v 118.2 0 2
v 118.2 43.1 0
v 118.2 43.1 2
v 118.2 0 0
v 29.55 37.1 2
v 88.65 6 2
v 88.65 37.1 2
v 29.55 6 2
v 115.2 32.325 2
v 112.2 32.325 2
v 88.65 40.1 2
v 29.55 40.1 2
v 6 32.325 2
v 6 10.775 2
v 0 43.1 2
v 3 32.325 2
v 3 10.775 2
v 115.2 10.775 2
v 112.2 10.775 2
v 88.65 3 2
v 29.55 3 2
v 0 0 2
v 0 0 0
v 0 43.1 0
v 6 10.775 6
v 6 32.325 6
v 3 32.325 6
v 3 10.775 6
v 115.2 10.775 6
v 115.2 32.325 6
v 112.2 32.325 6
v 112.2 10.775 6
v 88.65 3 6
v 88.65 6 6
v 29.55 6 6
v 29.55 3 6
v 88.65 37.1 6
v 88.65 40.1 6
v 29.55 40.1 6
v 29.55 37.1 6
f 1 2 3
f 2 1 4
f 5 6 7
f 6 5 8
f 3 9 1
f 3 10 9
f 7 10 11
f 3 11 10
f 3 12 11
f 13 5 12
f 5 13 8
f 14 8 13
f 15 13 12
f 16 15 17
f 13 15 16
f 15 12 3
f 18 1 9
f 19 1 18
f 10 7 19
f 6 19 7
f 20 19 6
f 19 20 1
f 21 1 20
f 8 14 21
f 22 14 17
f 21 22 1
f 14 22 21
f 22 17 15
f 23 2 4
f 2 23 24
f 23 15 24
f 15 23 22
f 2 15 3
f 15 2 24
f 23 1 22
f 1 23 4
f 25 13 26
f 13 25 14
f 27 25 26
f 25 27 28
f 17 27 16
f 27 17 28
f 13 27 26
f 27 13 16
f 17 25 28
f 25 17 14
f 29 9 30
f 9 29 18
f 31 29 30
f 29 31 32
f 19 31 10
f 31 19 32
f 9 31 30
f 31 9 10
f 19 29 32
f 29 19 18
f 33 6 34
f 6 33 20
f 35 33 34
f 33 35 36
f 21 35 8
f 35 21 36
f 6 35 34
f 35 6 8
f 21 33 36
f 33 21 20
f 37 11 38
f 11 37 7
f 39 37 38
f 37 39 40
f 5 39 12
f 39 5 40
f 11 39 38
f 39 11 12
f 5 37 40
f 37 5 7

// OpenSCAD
// zrakotron floorplan

//univ. const.
uspace=2;
uheight=2;

//mq slot
mq_l=41;
mq_w=17.3;
mq_off=20;
mq_hole=[7.53,8.34,0];
mq_holder_d=2;
mq_holder_l=20;
//meta
mq_ext_l=mq_l+2*uspace;
mq_ext_w=mq_w+2*uspace+2*mq_holder_d;
mq_holder_h=mq_off+3.2;

//mg811
mg_l=41.9;
mg_w=32;
mg_hoffset=3.5;
mg_h1=[mg_hoffset,mg_hoffset,0];
mg_h2=[mg_l-mg_hoffset,mg_hoffset,0];
mg_h3=[mg_hoffset,mg_w-mg_hoffset,0];
mg_h4=[mg_l-mg_hoffset,mg_w-mg_hoffset,0];
mg_space=2;
//mg811 meta
mg_ext_l=mg_l+2*mg_space;
mg_ext_w=mg_w+2*mg_space;

//esp8266
esp_l=24.8;
esp_w=14.35;
esp_holder_d=2;
esp_holder_l=esp_l-5;
esp_holder_h=6;
//esp meta
esp_ext_l=esp_l+2*uspace;
esp_ext_w=esp_w+2*esp_holder_d+2*uspace;

//power splitter
ps_l=35.5;
ps_w=21.1;
ps_holder_h=6;
ps_holder_d=2;
ps_holder_l=20;
ps_space=2;
//ps meta
ps_ext_l=ps_l+2*ps_space;
ps_ext_w=ps_w+2*ps_holder_d+2*ps_space;

//step-up section
su_l=43.8;
su_w=21.5;
su_space=2;
su_h1=[6.66,su_w-2.45,0];
su_h2=[su_l-6.66,2.45,0];
//stepup meta
su_ext_l=su_l+2*su_space;
su_ext_w=su_w+2*su_space;

//uno board
uno_w=54.05;
uno_ll=65.66;
uno_lr=68.56;
uno_tspace=2;
uno_bspace=3;
uno_lspace=2;
uno_rspace=4;
//board meta
uno_ext_w=uno_w+uno_lspace+uno_rspace;
uno_ext_l=uno_lr+uno_tspace+uno_bspace;
//pins
pin1=[50.95,13.6,0];    //uz power - ne koristiti za iteaduino
pin2=[2.82,15.11,0];    //uz usb
pin3=[46.05,66,0];      // uz procesor
pin4=[18.05,66,0];
pinr=3.1/2;
pinh=6;
//pin meta
outr=pinr+1;
botr=pinr+3;

//shinyei dust sensor
shin_l=59;
shin_w=44.7;
shin_h=19.5;
shin_cable_d=5.35;
shin_cable_l=15;
shin_cable_h=4.8;
shin_cable_space=5;
shin_hole=[27.2,40.64,0];
//shinyei meta
shinyei_ext_l=2*uspace+shin_l;
shinyei_ext_w=2*uspace+shin_w;

//dht11
dht_l=26.5;
dht_w=22;
dht_h1=[6.5,3,0];
dht_h2=[6.5,19,0];
//dht meta
dht_ext_l=dht_l+2*uspace;
dht_ext_w=dht_w+2*uspace;

//box
box_h=50;
pylon_l=6+2*botr;
pylon_w=2*botr;
//meta
box_l=uno_ext_w+shinyei_ext_w+2*mq_ext_w;
box_w=shinyei_ext_l+mg_ext_w+dht_ext_w;

//floorplan meta
pylon_v=[uno_ext_w/2-pylon_l/2,uno_ext_l,0];
dht_v=[-dht_ext_l,shinyei_ext_l+mg_ext_w,0];
esp_v=[0,uno_ext_l+pylon_w,0];
mg_v=[-mg_ext_l,shinyei_ext_l,0];
shinyei_v=[-shinyei_ext_w,0,0];
ps_v=[uno_ext_w-ps_ext_l,uno_ext_l+pylon_w,0];
mq_v1=[uno_ext_w+mq_ext_w,su_ext_w,0];
mq_v2=[uno_ext_w,2*mq_ext_l+su_ext_w,0];
mq_v3=[uno_ext_w+2*mq_ext_w,su_ext_w,0];
mq_v4=[uno_ext_w+mq_ext_w,2*mq_ext_l+su_ext_w,0];
su_v=[uno_ext_w,0,0];

//wall meta
p1=[0.5-pylon_l/2,0.5-pylon_l/2,0];
p2=[box_l-0.5+pylon_l/2,0.5-pylon_l/2,0];
p3=[box_l-0.5+pylon_l/2,box_w-0.5+pylon_l/2,0];
p4=[0.5-pylon_l/2,box_w-0.5+pylon_l/2,0];
p5=[box_l/2,0.5-pylon_l/2,0];
p6=[box_l/2,box_w-0.5+pylon_l/2,0];
p7=[0.5-pylon_l/2,box_w/2,0];
p8=[box_l-0.5+pylon_l/2,box_w/2,0];

w1=[box_l/4-pylon_l/4,0.5-pylon_l/2,0];
w2=[3*box_l/4+pylon_l/4,0.5-pylon_l/2,0];
w3=[box_l/4-pylon_l/4,box_w-0.5+pylon_l/2,0];
w4=[3*box_l/4+pylon_l/4,box_w-0.5+pylon_l/2,0];
w5=[0.5-pylon_l/2,box_w/4-pylon_l/4,0];
w6=[0.5-pylon_l/2,3*box_w/4+pylon_l/4,0];

w10=[box_l/2,0.5-pylon_l/2,0];
w20=[box_l/2,box_w-0.5+pylon_l/2,0];
w30=[box_l-0.5+pylon_l/2,box_w/2,0];
w40=[0.5-pylon_l/2,box_w/2,0];

//battery
bat_l=66.8;
bat_w=37.1;
bat_h=18.63;

//charger
ch_a=35.4;
ch_usb_l=8;
ch_usb_h=4;
ch_hole_r=2.2/2;
ch_offset=5;
ch_h_off=2.75;
ch_plug_off=6.62;

//battery box
wall_d=3;
binder=4.5;
plughole_l=6;
plughole_w=8;
//box meta
flap_w=pinr+2;
flap_l=flap_w*2;
wall_h=bat_h+binder;
batbox_l=bat_l+2*uspace+plughole_l+ch_a;
batbox_w=bat_w;
batbox_ext_l=batbox_l+2*wall_d;
batbox_ext_w=batbox_w+2*wall_d;

//zbox lid
box_ext_l=box_l+pylon_l+2;
box_ext_w=box_w+pylon_l+2;

batbox_lid();

module zbox_lid(){
    difference(){
        union(){
            cube([box_ext_l,box_ext_w,uheight],false);
            translate([1.5,1.5,0])cylinder(uheight+1,botr,botr,false,$fn=48);
            translate([box_ext_l-1.5,1.5,0])cylinder(uheight+1,botr,botr,false,$fn=48);
            translate([1.5,box_ext_w-1.5,0])cylinder(uheight+1,botr,botr,false,$fn=48);
            translate([box_ext_l-1.5,box_ext_w-1.5,0])cylinder(uheight+1,botr,botr,false,$fn=48);
            translate([shinyei_ext_w+uno_ext_w/2+pylon_l/2+1,uno_ext_l+pylon_l-2,0])cylinder(uheight+1,botr,botr,false,$fn=48);
        }
        translate([1.5,1.5,-0.5])cylinder(2*uheight+1,pinr,pinr,false,$fn=48);
        translate([box_ext_l-1.5,1.5,-0.5])cylinder(2*uheight+1,pinr,pinr,false,$fn=48);
        translate([1.5,box_ext_w-1.5,-0.5])cylinder(2*uheight+1,pinr,pinr,false,$fn=48);
        translate([box_ext_l-1.5,box_ext_w-1.5,-0.5])cylinder(2*uheight+1,pinr,pinr,false,$fn=48);
        translate([shinyei_ext_w+uno_ext_w/2+pylon_l/2+1,uno_ext_l+pylon_l-2,-0.5])cylinder(2*uheight+1,pinr,pinr,false,$fn=48);
        translate([50,20,-0.5]){
            translate([bat_l+uspace,ch_plug_off,0])cube([plughole_l,plughole_w,uheight+1],false);
            translate([0.5,-wall_d-flap_w,0])cylinder(2*uheight+1,pinr,pinr,false,$fn=48);
            translate([batbox_ext_l-flap_l+0.5,-wall_d-flap_w,0])cylinder(2*uheight+1,pinr,pinr,false,$fn=48);
            translate([0.5,batbox_ext_w+0.5,0])cylinder(2*uheight+1,pinr,pinr,false,$fn=48);
            translate([batbox_ext_l-flap_l+0.5,batbox_ext_w+0.5,0])cylinder(2*uheight+1,pinr,pinr,false,$fn=48);
        }
        translate([35,10,-0.5])rotate([0,0,90])air_bars(120,25,uheight+1,35);
    }
}

module charger(){
    union(){
        translate([ch_h_off,ch_h_off,0])charger_screwhole();
        translate([ch_a-ch_h_off,ch_h_off,0])charger_screwhole();
        translate([ch_h_off,ch_a-ch_h_off,0])charger_screwhole();
        translate([ch_a-ch_h_off,ch_a-ch_h_off,0])charger_screwhole();
    }
}

module charger_screwhole(){
    difference(){
        cylinder(ch_offset,ch_hole_r+2,ch_hole_r+1,false,$fn=48);
        translate([0,0,-0.5])cylinder(ch_offset+1,ch_hole_r,ch_hole_r,false,$fn=48);
    }
}

module battery(){
    translate([bat_l,0,0])cube([uspace,bat_w,bat_h/2],false);
}

module flap(){
    difference(){
        union(){
            translate([0,-flap_w,0])cube([flap_l,flap_w+.5,2*uheight],false);
            translate([flap_l/2,-flap_w,0])cylinder(2*uheight,pinr+2,pinr+2,false,$fn=48);
        }
        translate([flap_l/2,-flap_w,-0.5])cylinder(2*uheight+1,pinr,pinr,false,$fn=48);
    }
}

module batbox_lid(){
    union(){
        cube([batbox_ext_l,batbox_ext_w,uheight],false);
        translate([wall_d,batbox_ext_w/2-batbox_ext_w/4,uheight-0.5])cube([wall_d,batbox_ext_w/2,binder],false);
        translate([batbox_ext_l-2*wall_d,batbox_ext_w/2-batbox_ext_w/4,uheight-0.5])cube([wall_d,batbox_ext_w/2,binder],false);
        translate([batbox_ext_l/2-batbox_ext_l/4,wall_d,uheight-0.5])cube([batbox_ext_l/2,wall_d,binder],false);
        translate([batbox_ext_l/2-batbox_ext_l/4,batbox_ext_w-2*wall_d,uheight-0.5])cube([batbox_ext_l/2,wall_d,binder],false);
    }
}

module batbox(){
    union(){
        battery();
        translate([bat_l+2*uspace+plughole_l,batbox_w/2-ch_a/2,0])charger();
        difference(){
            translate([-wall_d,-wall_d,-uheight])union(){
                cube([batbox_ext_l,batbox_ext_w,uheight],false);
                flap();
                translate([batbox_ext_l-flap_l,0,0])flap();
                translate([flap_l,batbox_ext_w,0])rotate([0,0,180])flap();
                translate([batbox_ext_l,batbox_ext_w,0])rotate([0,0,180])flap();
            }
            translate([bat_l+uspace,ch_plug_off,-uheight-0.5])cube([plughole_l,plughole_w,uheight+1],false);
        }
        translate([-wall_d,-wall_d,0])cube([wall_d,batbox_ext_w,wall_h],false);
        translate([batbox_l,-wall_d,0])difference(){
            cube([wall_d,batbox_ext_w,wall_h],false);
            translate([-5,batbox_ext_w/2-ch_usb_l/2-1,ch_offset+0.5])cube([20,ch_usb_l+2,ch_usb_h+2],false);
            translate([1,batbox_ext_w/2-8,ch_offset+0.5-2])cube([20,16,ch_usb_h+2+4],false);
        }
        translate([-wall_d,-wall_d,0])cube([batbox_ext_l,wall_d,wall_h],false);
        translate([-wall_d,batbox_w,0])cube([batbox_ext_l,wall_d,wall_h],false);
    }
}

module zbox(){
    union(){
        floorplan();
        boxwall();
    }
}

module boxwall(){
    difference(){
        union(){
            //pylons
            translate(p1)rotate([0,0,0])edge_pylon(1);
            translate(p2)rotate([0,0,90])edge_pylon(1);
            translate(p3)rotate([0,0,180])edge_pylon(1);
            translate(p4)rotate([0,0,-90])edge_pylon(1);
            //translate(p5)rotate([0,0,0])edge_pylon(0);
            //translate(p6)rotate([0,0,180])edge_pylon(0);
            //translate(p7)rotate([0,0,-90])edge_pylon(0);
            //translate(p8)rotate([0,0,90])edge_pylon(0);
            //walls
//            translate(w1)wallside(box_l/2-pylon_l/2+1);
//            translate(w2)wallside(box_l/2-pylon_l/2+1);
//            translate(w3)rotate([0,0,180])wallside(box_l/2-pylon_l/2+1);
//            translate(w4)rotate([0,0,180])wallside(box_l/2-pylon_l/2+1);
//            translate(w5)rotate([0,0,-90])wallside(box_w/2-pylon_l/2+1);
//            translate(w6)rotate([0,0,-90])wallside(box_w/2-pylon_l/2+1);
//            translate([box_l-0.5+pylon_l/2,box_w/4-pylon_l/4,0])rotate([0,0,90])wallside(box_w/2-pylon_l/2+1);
//            translate([box_l-0.5+pylon_l/2,3*box_w/4+pylon_l/4,0])rotate([0,0,90])wallside(box_w/2-pylon_l/2+1);
            translate(w10)wallside(box_l+1);
            translate(w20)rotate([0,0,180])wallside(box_l+1);
            translate(w30)rotate([0,0,90])wallside(box_w+1);
            translate(w40)rotate([0,0,-90])wallside(box_w+1);
        }
        translate([shinyei_ext_w,0,0]){
            //translate(shinyei_v)shinyei_airholes();
            arduino_usb();
        }
    }
}

module floorplan(){
    translate([shinyei_ext_w,0,0])difference(){
        union(){
            translate([-shinyei_ext_w,0,0])cube([box_l,box_w,uheight],false);
            arduino();
            translate(pylon_v)inner_pylon();
            translate(dht_v)rotate([0,0,0])dht11();
            translate(esp_v)esp8266();
            translate(mg_v)rotate([0,0,0])mg811();
            translate(shinyei_v)shinyei();
            translate(ps_v)rotate([0,0,0])power_splitter();
            translate(su_v)stepup();
            translate(mq_v1)rotate([0,0,90])mqslot();
            translate(mq_v2)rotate([0,0,-90])mqslot();
            translate(mq_v3)rotate([0,0,90])mqslot();
            translate(mq_v4)rotate([0,0,-90])mqslot();
        }
        translate(mq_v1)rotate([0,0,90])mqslot_airholes();
        translate(mq_v2)rotate([0,0,-90])mqslot_airholes();
        translate(mq_v3)rotate([0,0,90])mqslot_airholes();
        translate(mq_v4)rotate([0,0,-90])mqslot_airholes();
        translate(su_v)stepup_airholes();
    }
}

module dht11(){
    translate([uspace,uspace,uheight])union(){
        translate([-uspace,-uspace,-uheight])cube([dht_ext_l,dht_ext_w,uheight],false);
        translate(dht_h1)screwhole();
        translate(dht_h2)screwhole();
    }
}

module mqslot(){
    translate([uspace,uspace+mq_holder_d,uheight])union(){
        translate([-uspace,-uspace-mq_holder_d,-uheight]){
            cube([mq_ext_l,mq_ext_w,uheight],false);
        }
        translate([0,-mq_holder_d,0])cube([mq_holder_l,mq_holder_d,mq_holder_h],false);
        translate([0,mq_w,0])cube([mq_holder_l,mq_holder_d,mq_holder_h],false);
        translate([0,0,0])cube([mq_holder_d,mq_w,mq_holder_h/1.5],false);
        translate(mq_hole)difference(){
            cylinder(mq_off,botr,outr,false,$fn=32);
            translate([0,0,-0.5])cylinder(mq_off+1,pinr,pinr,false,$fn=32);
        }
    }
}

module mqslot_airholes(){
    for(i=[0,1,2,3,4,5]){
        translate([uspace+15+4.5*i,uspace+mq_holder_d,-0.5])cube([2,mq_w,uheight+1],false);
    }
}

module shinyei(){
    translate([0,shinyei_ext_l,0])rotate([0,0,-90])translate([uspace,uspace,uheight])union(){
        translate([-uspace,-uspace,-uheight])cube([shinyei_ext_l,shinyei_ext_w,uheight],false);
        corner_holder(3,pinh,2,4,0);
        translate([shin_l,0,0])corner_holder(3,pinh,2,4,1);
        translate([shin_l,shin_w,0])corner_holder(3,pinh,2,4,2);
        translate([0,shin_w,0])corner_holder(3,pinh,2,4,3);
        translate(shin_hole)screwhole();
    }
}

module shinyei_airholes(){
    air_l=8*2+3*2.5;
    translate([0,0,box_h/2-15])for(i=[0,1,2,3,4,5,6,7]){
        translate([-50,8+4.5*i,-0.5])cube([50,2,30],false);
    }
}

module corner_holder(cha,chh,chd,cho,rot){
    points=[[cha,cha,0],[-chd,cha,0],[-chd,cha+cho,0],[cha+cho,cha+cho,0],[cha+cho,-chd,0],[cha,-chd,0],[cha,cha,chh],[-chd,cha,chh],[cha,-chd,chh]];
    tris=[[0,1,6],[6,1,7],[1,2,7],[2,6,7],[2,3,6],[2,1,0],[3,2,0],[6,5,0],[6,8,5],[4,5,8],[0,5,4],[4,3,0],[4,8,6],[4,6,3]];
    rotate([0,0,90*rot])union(){
        cube([cha,cha,chh],false);
        translate([0,-chd,0])cube([cha,chd,chh+2],false);
        translate([-chd,-chd,0])cube([chd,cha+chd,chh+2],false);
        polyhedron(points,tris,10);
    }
}

module mg811(){
    translate([mg_space,mg_space,uheight])union(){
        translate([-mg_space,-mg_space,-uheight])cube([mg_l+2*mg_space,mg_w+2*mg_space,uheight],false);
        translate(mg_h1)screwhole();
        translate(mg_h2)screwhole();
        translate(mg_h3)screwhole();
        translate(mg_h4)screwhole();
    } 
}

module stepup(){
    translate([su_space,su_space,uheight])union(){
        translate([-su_space,-su_space,-uheight])cube([su_ext_l,su_ext_w,uheight],false);
        translate(su_h1)screwhole();
        translate(su_h2)screwhole();
    } 
}

module stepup_airholes(){
    air_l=4*2+3*2.5;
    translate([su_ext_l/2-air_l/2,0,0])for(i=[0,1,2,3]){
        translate([4.5*i,uspace,-0.5])cube([2,su_w,uheight+1],false);
    }
}

module arduino(){
    translate([uno_lspace,uno_bspace,uheight])union(){
        translate([-uno_lspace,-uno_bspace,-uheight])cube([uno_ext_w,uno_ext_l,uheight],false);
        screwholes();
        translate([uno_w,0,0])corner_holder(3,pinh,2,4,1);
    }
}

module arduino_usb(){
    translate([8.91+uno_lspace-0.5,-25,8.6-0.5])cube([12+2,50,11+2],false);
}

module esp8266(){
    translate([esp_ext_w,0,0])rotate([0,0,90])translate([uspace,uspace,uheight])union(){
        translate([-uspace,-uspace,-uheight])cube([esp_l+2*uspace,esp_w+2*esp_holder_d+2*uspace,uheight],false);
        translate([esp_l/2-esp_holder_l/2,0,0]){
            cube([esp_holder_l,esp_holder_d,esp_holder_h],false);
            translate([0,esp_w+esp_holder_d,0])cube([esp_holder_l,esp_holder_d,esp_holder_h],false);
        }
    }
}

module power_splitter(){
    translate([ps_space,ps_space,uheight])union(){
        translate([-ps_space,-ps_space,-uheight])cube([ps_ext_l,ps_ext_w,uheight],false);
        translate([ps_l/2-ps_holder_l/2,0,0]){
            cube([ps_holder_l,ps_holder_d,ps_holder_h],false);
            translate([0,ps_w+ps_holder_d,0])cube([ps_holder_l,ps_holder_d,ps_holder_h],false);
        }
    }
}

module screwholes(){
    union(){
        //translate(pin1)screwhole();
        translate(pin2)screwhole();
        translate(pin3)screwhole();
        translate(pin4)screwhole();
    }
}

module inner_pylon(){
    translate([pylon_l/2,pylon_w/2,uheight])union(){
        translate([-pylon_l/2,-pylon_w/2,-uheight])cube([pylon_l,pylon_w,uheight],false);
        difference(){
            union(){
                cylinder(box_h,botr,botr,false,$fn=48);
                translate([-botr-3,-1.5,0])cube([2*botr+6,3,box_h],false);
            }
            translate([0,0,-0.5])cylinder(box_h+1,pinr,pinr,false,$fn=48);
        }
    }
}

module edge_pylon(type){
    translate([0,0,uheight])union(){
        if(type==0)translate([-pylon_l/2,-1.5,-uheight])cube([pylon_l,pylon_l/2+1.5,uheight],false);
        if(type==1)translate([-1.5,-1.5,-uheight])cube([pylon_l/2+1.5,pylon_l/2+1.5,uheight],false);
        translate([0,0,-uheight])cylinder(uheight,botr,botr,false,$fn=48);
        difference(){
            union(){
                cylinder(box_h,botr,botr,false,$fn=48);
                if(type==0)translate([-botr-3,-1.5,0])cube([2*botr+6,3,box_h],false);
                if(type==1){
                    translate([-1.5,0,0])cube([3,botr+3,box_h],false);
                    translate([0,-1.5,0])cube([botr+3,3,box_h],false);
                }
            }
            translate([0,0,-0.5])cylinder(box_h+1,pinr,pinr,false,$fn=48);
        }
    }
}

module wallside(length){
    translate([0,0,uheight])union(){
        translate([-length/2,-1.5,-uheight])cube([length,pylon_l/2+1.5,uheight],false);
        translate([-length/2,-1.5,0])cube([length,3,box_h],false);
    }
}

module screwhole(){
    difference(){
        cylinder(pinh,botr,outr,false,$fn=32);
        translate([0,0,-0.5])cylinder(pinh+1,pinr-0.5,pinr+0.25,false,$fn=32);
    }
}

module screw_rings(){
    for(i=[0,1,2,3]){
        for(j=[0,1,2,3]){
            translate([i*2*(mq_hole_radius+uspace+1),j*2*(mq_hole_radius+uspace+1),0])difference(){
                cylinder(uheight,mq_hole_radius+uspace,mq_hole_radius+uspace,false,$fn=32);
                cylinder(uheight*3,mq_hole_radius,mq_hole_radius,true,$fn=32);
            }
        }
    }
}

module air_bars(l,w,h,n){
    barl=l/(2*n-1);
    for(i=[0:1:n-1]){
        translate([i*(l-barl)/(n-1),0,0])cube([barl,w,h],false);
    }
}
